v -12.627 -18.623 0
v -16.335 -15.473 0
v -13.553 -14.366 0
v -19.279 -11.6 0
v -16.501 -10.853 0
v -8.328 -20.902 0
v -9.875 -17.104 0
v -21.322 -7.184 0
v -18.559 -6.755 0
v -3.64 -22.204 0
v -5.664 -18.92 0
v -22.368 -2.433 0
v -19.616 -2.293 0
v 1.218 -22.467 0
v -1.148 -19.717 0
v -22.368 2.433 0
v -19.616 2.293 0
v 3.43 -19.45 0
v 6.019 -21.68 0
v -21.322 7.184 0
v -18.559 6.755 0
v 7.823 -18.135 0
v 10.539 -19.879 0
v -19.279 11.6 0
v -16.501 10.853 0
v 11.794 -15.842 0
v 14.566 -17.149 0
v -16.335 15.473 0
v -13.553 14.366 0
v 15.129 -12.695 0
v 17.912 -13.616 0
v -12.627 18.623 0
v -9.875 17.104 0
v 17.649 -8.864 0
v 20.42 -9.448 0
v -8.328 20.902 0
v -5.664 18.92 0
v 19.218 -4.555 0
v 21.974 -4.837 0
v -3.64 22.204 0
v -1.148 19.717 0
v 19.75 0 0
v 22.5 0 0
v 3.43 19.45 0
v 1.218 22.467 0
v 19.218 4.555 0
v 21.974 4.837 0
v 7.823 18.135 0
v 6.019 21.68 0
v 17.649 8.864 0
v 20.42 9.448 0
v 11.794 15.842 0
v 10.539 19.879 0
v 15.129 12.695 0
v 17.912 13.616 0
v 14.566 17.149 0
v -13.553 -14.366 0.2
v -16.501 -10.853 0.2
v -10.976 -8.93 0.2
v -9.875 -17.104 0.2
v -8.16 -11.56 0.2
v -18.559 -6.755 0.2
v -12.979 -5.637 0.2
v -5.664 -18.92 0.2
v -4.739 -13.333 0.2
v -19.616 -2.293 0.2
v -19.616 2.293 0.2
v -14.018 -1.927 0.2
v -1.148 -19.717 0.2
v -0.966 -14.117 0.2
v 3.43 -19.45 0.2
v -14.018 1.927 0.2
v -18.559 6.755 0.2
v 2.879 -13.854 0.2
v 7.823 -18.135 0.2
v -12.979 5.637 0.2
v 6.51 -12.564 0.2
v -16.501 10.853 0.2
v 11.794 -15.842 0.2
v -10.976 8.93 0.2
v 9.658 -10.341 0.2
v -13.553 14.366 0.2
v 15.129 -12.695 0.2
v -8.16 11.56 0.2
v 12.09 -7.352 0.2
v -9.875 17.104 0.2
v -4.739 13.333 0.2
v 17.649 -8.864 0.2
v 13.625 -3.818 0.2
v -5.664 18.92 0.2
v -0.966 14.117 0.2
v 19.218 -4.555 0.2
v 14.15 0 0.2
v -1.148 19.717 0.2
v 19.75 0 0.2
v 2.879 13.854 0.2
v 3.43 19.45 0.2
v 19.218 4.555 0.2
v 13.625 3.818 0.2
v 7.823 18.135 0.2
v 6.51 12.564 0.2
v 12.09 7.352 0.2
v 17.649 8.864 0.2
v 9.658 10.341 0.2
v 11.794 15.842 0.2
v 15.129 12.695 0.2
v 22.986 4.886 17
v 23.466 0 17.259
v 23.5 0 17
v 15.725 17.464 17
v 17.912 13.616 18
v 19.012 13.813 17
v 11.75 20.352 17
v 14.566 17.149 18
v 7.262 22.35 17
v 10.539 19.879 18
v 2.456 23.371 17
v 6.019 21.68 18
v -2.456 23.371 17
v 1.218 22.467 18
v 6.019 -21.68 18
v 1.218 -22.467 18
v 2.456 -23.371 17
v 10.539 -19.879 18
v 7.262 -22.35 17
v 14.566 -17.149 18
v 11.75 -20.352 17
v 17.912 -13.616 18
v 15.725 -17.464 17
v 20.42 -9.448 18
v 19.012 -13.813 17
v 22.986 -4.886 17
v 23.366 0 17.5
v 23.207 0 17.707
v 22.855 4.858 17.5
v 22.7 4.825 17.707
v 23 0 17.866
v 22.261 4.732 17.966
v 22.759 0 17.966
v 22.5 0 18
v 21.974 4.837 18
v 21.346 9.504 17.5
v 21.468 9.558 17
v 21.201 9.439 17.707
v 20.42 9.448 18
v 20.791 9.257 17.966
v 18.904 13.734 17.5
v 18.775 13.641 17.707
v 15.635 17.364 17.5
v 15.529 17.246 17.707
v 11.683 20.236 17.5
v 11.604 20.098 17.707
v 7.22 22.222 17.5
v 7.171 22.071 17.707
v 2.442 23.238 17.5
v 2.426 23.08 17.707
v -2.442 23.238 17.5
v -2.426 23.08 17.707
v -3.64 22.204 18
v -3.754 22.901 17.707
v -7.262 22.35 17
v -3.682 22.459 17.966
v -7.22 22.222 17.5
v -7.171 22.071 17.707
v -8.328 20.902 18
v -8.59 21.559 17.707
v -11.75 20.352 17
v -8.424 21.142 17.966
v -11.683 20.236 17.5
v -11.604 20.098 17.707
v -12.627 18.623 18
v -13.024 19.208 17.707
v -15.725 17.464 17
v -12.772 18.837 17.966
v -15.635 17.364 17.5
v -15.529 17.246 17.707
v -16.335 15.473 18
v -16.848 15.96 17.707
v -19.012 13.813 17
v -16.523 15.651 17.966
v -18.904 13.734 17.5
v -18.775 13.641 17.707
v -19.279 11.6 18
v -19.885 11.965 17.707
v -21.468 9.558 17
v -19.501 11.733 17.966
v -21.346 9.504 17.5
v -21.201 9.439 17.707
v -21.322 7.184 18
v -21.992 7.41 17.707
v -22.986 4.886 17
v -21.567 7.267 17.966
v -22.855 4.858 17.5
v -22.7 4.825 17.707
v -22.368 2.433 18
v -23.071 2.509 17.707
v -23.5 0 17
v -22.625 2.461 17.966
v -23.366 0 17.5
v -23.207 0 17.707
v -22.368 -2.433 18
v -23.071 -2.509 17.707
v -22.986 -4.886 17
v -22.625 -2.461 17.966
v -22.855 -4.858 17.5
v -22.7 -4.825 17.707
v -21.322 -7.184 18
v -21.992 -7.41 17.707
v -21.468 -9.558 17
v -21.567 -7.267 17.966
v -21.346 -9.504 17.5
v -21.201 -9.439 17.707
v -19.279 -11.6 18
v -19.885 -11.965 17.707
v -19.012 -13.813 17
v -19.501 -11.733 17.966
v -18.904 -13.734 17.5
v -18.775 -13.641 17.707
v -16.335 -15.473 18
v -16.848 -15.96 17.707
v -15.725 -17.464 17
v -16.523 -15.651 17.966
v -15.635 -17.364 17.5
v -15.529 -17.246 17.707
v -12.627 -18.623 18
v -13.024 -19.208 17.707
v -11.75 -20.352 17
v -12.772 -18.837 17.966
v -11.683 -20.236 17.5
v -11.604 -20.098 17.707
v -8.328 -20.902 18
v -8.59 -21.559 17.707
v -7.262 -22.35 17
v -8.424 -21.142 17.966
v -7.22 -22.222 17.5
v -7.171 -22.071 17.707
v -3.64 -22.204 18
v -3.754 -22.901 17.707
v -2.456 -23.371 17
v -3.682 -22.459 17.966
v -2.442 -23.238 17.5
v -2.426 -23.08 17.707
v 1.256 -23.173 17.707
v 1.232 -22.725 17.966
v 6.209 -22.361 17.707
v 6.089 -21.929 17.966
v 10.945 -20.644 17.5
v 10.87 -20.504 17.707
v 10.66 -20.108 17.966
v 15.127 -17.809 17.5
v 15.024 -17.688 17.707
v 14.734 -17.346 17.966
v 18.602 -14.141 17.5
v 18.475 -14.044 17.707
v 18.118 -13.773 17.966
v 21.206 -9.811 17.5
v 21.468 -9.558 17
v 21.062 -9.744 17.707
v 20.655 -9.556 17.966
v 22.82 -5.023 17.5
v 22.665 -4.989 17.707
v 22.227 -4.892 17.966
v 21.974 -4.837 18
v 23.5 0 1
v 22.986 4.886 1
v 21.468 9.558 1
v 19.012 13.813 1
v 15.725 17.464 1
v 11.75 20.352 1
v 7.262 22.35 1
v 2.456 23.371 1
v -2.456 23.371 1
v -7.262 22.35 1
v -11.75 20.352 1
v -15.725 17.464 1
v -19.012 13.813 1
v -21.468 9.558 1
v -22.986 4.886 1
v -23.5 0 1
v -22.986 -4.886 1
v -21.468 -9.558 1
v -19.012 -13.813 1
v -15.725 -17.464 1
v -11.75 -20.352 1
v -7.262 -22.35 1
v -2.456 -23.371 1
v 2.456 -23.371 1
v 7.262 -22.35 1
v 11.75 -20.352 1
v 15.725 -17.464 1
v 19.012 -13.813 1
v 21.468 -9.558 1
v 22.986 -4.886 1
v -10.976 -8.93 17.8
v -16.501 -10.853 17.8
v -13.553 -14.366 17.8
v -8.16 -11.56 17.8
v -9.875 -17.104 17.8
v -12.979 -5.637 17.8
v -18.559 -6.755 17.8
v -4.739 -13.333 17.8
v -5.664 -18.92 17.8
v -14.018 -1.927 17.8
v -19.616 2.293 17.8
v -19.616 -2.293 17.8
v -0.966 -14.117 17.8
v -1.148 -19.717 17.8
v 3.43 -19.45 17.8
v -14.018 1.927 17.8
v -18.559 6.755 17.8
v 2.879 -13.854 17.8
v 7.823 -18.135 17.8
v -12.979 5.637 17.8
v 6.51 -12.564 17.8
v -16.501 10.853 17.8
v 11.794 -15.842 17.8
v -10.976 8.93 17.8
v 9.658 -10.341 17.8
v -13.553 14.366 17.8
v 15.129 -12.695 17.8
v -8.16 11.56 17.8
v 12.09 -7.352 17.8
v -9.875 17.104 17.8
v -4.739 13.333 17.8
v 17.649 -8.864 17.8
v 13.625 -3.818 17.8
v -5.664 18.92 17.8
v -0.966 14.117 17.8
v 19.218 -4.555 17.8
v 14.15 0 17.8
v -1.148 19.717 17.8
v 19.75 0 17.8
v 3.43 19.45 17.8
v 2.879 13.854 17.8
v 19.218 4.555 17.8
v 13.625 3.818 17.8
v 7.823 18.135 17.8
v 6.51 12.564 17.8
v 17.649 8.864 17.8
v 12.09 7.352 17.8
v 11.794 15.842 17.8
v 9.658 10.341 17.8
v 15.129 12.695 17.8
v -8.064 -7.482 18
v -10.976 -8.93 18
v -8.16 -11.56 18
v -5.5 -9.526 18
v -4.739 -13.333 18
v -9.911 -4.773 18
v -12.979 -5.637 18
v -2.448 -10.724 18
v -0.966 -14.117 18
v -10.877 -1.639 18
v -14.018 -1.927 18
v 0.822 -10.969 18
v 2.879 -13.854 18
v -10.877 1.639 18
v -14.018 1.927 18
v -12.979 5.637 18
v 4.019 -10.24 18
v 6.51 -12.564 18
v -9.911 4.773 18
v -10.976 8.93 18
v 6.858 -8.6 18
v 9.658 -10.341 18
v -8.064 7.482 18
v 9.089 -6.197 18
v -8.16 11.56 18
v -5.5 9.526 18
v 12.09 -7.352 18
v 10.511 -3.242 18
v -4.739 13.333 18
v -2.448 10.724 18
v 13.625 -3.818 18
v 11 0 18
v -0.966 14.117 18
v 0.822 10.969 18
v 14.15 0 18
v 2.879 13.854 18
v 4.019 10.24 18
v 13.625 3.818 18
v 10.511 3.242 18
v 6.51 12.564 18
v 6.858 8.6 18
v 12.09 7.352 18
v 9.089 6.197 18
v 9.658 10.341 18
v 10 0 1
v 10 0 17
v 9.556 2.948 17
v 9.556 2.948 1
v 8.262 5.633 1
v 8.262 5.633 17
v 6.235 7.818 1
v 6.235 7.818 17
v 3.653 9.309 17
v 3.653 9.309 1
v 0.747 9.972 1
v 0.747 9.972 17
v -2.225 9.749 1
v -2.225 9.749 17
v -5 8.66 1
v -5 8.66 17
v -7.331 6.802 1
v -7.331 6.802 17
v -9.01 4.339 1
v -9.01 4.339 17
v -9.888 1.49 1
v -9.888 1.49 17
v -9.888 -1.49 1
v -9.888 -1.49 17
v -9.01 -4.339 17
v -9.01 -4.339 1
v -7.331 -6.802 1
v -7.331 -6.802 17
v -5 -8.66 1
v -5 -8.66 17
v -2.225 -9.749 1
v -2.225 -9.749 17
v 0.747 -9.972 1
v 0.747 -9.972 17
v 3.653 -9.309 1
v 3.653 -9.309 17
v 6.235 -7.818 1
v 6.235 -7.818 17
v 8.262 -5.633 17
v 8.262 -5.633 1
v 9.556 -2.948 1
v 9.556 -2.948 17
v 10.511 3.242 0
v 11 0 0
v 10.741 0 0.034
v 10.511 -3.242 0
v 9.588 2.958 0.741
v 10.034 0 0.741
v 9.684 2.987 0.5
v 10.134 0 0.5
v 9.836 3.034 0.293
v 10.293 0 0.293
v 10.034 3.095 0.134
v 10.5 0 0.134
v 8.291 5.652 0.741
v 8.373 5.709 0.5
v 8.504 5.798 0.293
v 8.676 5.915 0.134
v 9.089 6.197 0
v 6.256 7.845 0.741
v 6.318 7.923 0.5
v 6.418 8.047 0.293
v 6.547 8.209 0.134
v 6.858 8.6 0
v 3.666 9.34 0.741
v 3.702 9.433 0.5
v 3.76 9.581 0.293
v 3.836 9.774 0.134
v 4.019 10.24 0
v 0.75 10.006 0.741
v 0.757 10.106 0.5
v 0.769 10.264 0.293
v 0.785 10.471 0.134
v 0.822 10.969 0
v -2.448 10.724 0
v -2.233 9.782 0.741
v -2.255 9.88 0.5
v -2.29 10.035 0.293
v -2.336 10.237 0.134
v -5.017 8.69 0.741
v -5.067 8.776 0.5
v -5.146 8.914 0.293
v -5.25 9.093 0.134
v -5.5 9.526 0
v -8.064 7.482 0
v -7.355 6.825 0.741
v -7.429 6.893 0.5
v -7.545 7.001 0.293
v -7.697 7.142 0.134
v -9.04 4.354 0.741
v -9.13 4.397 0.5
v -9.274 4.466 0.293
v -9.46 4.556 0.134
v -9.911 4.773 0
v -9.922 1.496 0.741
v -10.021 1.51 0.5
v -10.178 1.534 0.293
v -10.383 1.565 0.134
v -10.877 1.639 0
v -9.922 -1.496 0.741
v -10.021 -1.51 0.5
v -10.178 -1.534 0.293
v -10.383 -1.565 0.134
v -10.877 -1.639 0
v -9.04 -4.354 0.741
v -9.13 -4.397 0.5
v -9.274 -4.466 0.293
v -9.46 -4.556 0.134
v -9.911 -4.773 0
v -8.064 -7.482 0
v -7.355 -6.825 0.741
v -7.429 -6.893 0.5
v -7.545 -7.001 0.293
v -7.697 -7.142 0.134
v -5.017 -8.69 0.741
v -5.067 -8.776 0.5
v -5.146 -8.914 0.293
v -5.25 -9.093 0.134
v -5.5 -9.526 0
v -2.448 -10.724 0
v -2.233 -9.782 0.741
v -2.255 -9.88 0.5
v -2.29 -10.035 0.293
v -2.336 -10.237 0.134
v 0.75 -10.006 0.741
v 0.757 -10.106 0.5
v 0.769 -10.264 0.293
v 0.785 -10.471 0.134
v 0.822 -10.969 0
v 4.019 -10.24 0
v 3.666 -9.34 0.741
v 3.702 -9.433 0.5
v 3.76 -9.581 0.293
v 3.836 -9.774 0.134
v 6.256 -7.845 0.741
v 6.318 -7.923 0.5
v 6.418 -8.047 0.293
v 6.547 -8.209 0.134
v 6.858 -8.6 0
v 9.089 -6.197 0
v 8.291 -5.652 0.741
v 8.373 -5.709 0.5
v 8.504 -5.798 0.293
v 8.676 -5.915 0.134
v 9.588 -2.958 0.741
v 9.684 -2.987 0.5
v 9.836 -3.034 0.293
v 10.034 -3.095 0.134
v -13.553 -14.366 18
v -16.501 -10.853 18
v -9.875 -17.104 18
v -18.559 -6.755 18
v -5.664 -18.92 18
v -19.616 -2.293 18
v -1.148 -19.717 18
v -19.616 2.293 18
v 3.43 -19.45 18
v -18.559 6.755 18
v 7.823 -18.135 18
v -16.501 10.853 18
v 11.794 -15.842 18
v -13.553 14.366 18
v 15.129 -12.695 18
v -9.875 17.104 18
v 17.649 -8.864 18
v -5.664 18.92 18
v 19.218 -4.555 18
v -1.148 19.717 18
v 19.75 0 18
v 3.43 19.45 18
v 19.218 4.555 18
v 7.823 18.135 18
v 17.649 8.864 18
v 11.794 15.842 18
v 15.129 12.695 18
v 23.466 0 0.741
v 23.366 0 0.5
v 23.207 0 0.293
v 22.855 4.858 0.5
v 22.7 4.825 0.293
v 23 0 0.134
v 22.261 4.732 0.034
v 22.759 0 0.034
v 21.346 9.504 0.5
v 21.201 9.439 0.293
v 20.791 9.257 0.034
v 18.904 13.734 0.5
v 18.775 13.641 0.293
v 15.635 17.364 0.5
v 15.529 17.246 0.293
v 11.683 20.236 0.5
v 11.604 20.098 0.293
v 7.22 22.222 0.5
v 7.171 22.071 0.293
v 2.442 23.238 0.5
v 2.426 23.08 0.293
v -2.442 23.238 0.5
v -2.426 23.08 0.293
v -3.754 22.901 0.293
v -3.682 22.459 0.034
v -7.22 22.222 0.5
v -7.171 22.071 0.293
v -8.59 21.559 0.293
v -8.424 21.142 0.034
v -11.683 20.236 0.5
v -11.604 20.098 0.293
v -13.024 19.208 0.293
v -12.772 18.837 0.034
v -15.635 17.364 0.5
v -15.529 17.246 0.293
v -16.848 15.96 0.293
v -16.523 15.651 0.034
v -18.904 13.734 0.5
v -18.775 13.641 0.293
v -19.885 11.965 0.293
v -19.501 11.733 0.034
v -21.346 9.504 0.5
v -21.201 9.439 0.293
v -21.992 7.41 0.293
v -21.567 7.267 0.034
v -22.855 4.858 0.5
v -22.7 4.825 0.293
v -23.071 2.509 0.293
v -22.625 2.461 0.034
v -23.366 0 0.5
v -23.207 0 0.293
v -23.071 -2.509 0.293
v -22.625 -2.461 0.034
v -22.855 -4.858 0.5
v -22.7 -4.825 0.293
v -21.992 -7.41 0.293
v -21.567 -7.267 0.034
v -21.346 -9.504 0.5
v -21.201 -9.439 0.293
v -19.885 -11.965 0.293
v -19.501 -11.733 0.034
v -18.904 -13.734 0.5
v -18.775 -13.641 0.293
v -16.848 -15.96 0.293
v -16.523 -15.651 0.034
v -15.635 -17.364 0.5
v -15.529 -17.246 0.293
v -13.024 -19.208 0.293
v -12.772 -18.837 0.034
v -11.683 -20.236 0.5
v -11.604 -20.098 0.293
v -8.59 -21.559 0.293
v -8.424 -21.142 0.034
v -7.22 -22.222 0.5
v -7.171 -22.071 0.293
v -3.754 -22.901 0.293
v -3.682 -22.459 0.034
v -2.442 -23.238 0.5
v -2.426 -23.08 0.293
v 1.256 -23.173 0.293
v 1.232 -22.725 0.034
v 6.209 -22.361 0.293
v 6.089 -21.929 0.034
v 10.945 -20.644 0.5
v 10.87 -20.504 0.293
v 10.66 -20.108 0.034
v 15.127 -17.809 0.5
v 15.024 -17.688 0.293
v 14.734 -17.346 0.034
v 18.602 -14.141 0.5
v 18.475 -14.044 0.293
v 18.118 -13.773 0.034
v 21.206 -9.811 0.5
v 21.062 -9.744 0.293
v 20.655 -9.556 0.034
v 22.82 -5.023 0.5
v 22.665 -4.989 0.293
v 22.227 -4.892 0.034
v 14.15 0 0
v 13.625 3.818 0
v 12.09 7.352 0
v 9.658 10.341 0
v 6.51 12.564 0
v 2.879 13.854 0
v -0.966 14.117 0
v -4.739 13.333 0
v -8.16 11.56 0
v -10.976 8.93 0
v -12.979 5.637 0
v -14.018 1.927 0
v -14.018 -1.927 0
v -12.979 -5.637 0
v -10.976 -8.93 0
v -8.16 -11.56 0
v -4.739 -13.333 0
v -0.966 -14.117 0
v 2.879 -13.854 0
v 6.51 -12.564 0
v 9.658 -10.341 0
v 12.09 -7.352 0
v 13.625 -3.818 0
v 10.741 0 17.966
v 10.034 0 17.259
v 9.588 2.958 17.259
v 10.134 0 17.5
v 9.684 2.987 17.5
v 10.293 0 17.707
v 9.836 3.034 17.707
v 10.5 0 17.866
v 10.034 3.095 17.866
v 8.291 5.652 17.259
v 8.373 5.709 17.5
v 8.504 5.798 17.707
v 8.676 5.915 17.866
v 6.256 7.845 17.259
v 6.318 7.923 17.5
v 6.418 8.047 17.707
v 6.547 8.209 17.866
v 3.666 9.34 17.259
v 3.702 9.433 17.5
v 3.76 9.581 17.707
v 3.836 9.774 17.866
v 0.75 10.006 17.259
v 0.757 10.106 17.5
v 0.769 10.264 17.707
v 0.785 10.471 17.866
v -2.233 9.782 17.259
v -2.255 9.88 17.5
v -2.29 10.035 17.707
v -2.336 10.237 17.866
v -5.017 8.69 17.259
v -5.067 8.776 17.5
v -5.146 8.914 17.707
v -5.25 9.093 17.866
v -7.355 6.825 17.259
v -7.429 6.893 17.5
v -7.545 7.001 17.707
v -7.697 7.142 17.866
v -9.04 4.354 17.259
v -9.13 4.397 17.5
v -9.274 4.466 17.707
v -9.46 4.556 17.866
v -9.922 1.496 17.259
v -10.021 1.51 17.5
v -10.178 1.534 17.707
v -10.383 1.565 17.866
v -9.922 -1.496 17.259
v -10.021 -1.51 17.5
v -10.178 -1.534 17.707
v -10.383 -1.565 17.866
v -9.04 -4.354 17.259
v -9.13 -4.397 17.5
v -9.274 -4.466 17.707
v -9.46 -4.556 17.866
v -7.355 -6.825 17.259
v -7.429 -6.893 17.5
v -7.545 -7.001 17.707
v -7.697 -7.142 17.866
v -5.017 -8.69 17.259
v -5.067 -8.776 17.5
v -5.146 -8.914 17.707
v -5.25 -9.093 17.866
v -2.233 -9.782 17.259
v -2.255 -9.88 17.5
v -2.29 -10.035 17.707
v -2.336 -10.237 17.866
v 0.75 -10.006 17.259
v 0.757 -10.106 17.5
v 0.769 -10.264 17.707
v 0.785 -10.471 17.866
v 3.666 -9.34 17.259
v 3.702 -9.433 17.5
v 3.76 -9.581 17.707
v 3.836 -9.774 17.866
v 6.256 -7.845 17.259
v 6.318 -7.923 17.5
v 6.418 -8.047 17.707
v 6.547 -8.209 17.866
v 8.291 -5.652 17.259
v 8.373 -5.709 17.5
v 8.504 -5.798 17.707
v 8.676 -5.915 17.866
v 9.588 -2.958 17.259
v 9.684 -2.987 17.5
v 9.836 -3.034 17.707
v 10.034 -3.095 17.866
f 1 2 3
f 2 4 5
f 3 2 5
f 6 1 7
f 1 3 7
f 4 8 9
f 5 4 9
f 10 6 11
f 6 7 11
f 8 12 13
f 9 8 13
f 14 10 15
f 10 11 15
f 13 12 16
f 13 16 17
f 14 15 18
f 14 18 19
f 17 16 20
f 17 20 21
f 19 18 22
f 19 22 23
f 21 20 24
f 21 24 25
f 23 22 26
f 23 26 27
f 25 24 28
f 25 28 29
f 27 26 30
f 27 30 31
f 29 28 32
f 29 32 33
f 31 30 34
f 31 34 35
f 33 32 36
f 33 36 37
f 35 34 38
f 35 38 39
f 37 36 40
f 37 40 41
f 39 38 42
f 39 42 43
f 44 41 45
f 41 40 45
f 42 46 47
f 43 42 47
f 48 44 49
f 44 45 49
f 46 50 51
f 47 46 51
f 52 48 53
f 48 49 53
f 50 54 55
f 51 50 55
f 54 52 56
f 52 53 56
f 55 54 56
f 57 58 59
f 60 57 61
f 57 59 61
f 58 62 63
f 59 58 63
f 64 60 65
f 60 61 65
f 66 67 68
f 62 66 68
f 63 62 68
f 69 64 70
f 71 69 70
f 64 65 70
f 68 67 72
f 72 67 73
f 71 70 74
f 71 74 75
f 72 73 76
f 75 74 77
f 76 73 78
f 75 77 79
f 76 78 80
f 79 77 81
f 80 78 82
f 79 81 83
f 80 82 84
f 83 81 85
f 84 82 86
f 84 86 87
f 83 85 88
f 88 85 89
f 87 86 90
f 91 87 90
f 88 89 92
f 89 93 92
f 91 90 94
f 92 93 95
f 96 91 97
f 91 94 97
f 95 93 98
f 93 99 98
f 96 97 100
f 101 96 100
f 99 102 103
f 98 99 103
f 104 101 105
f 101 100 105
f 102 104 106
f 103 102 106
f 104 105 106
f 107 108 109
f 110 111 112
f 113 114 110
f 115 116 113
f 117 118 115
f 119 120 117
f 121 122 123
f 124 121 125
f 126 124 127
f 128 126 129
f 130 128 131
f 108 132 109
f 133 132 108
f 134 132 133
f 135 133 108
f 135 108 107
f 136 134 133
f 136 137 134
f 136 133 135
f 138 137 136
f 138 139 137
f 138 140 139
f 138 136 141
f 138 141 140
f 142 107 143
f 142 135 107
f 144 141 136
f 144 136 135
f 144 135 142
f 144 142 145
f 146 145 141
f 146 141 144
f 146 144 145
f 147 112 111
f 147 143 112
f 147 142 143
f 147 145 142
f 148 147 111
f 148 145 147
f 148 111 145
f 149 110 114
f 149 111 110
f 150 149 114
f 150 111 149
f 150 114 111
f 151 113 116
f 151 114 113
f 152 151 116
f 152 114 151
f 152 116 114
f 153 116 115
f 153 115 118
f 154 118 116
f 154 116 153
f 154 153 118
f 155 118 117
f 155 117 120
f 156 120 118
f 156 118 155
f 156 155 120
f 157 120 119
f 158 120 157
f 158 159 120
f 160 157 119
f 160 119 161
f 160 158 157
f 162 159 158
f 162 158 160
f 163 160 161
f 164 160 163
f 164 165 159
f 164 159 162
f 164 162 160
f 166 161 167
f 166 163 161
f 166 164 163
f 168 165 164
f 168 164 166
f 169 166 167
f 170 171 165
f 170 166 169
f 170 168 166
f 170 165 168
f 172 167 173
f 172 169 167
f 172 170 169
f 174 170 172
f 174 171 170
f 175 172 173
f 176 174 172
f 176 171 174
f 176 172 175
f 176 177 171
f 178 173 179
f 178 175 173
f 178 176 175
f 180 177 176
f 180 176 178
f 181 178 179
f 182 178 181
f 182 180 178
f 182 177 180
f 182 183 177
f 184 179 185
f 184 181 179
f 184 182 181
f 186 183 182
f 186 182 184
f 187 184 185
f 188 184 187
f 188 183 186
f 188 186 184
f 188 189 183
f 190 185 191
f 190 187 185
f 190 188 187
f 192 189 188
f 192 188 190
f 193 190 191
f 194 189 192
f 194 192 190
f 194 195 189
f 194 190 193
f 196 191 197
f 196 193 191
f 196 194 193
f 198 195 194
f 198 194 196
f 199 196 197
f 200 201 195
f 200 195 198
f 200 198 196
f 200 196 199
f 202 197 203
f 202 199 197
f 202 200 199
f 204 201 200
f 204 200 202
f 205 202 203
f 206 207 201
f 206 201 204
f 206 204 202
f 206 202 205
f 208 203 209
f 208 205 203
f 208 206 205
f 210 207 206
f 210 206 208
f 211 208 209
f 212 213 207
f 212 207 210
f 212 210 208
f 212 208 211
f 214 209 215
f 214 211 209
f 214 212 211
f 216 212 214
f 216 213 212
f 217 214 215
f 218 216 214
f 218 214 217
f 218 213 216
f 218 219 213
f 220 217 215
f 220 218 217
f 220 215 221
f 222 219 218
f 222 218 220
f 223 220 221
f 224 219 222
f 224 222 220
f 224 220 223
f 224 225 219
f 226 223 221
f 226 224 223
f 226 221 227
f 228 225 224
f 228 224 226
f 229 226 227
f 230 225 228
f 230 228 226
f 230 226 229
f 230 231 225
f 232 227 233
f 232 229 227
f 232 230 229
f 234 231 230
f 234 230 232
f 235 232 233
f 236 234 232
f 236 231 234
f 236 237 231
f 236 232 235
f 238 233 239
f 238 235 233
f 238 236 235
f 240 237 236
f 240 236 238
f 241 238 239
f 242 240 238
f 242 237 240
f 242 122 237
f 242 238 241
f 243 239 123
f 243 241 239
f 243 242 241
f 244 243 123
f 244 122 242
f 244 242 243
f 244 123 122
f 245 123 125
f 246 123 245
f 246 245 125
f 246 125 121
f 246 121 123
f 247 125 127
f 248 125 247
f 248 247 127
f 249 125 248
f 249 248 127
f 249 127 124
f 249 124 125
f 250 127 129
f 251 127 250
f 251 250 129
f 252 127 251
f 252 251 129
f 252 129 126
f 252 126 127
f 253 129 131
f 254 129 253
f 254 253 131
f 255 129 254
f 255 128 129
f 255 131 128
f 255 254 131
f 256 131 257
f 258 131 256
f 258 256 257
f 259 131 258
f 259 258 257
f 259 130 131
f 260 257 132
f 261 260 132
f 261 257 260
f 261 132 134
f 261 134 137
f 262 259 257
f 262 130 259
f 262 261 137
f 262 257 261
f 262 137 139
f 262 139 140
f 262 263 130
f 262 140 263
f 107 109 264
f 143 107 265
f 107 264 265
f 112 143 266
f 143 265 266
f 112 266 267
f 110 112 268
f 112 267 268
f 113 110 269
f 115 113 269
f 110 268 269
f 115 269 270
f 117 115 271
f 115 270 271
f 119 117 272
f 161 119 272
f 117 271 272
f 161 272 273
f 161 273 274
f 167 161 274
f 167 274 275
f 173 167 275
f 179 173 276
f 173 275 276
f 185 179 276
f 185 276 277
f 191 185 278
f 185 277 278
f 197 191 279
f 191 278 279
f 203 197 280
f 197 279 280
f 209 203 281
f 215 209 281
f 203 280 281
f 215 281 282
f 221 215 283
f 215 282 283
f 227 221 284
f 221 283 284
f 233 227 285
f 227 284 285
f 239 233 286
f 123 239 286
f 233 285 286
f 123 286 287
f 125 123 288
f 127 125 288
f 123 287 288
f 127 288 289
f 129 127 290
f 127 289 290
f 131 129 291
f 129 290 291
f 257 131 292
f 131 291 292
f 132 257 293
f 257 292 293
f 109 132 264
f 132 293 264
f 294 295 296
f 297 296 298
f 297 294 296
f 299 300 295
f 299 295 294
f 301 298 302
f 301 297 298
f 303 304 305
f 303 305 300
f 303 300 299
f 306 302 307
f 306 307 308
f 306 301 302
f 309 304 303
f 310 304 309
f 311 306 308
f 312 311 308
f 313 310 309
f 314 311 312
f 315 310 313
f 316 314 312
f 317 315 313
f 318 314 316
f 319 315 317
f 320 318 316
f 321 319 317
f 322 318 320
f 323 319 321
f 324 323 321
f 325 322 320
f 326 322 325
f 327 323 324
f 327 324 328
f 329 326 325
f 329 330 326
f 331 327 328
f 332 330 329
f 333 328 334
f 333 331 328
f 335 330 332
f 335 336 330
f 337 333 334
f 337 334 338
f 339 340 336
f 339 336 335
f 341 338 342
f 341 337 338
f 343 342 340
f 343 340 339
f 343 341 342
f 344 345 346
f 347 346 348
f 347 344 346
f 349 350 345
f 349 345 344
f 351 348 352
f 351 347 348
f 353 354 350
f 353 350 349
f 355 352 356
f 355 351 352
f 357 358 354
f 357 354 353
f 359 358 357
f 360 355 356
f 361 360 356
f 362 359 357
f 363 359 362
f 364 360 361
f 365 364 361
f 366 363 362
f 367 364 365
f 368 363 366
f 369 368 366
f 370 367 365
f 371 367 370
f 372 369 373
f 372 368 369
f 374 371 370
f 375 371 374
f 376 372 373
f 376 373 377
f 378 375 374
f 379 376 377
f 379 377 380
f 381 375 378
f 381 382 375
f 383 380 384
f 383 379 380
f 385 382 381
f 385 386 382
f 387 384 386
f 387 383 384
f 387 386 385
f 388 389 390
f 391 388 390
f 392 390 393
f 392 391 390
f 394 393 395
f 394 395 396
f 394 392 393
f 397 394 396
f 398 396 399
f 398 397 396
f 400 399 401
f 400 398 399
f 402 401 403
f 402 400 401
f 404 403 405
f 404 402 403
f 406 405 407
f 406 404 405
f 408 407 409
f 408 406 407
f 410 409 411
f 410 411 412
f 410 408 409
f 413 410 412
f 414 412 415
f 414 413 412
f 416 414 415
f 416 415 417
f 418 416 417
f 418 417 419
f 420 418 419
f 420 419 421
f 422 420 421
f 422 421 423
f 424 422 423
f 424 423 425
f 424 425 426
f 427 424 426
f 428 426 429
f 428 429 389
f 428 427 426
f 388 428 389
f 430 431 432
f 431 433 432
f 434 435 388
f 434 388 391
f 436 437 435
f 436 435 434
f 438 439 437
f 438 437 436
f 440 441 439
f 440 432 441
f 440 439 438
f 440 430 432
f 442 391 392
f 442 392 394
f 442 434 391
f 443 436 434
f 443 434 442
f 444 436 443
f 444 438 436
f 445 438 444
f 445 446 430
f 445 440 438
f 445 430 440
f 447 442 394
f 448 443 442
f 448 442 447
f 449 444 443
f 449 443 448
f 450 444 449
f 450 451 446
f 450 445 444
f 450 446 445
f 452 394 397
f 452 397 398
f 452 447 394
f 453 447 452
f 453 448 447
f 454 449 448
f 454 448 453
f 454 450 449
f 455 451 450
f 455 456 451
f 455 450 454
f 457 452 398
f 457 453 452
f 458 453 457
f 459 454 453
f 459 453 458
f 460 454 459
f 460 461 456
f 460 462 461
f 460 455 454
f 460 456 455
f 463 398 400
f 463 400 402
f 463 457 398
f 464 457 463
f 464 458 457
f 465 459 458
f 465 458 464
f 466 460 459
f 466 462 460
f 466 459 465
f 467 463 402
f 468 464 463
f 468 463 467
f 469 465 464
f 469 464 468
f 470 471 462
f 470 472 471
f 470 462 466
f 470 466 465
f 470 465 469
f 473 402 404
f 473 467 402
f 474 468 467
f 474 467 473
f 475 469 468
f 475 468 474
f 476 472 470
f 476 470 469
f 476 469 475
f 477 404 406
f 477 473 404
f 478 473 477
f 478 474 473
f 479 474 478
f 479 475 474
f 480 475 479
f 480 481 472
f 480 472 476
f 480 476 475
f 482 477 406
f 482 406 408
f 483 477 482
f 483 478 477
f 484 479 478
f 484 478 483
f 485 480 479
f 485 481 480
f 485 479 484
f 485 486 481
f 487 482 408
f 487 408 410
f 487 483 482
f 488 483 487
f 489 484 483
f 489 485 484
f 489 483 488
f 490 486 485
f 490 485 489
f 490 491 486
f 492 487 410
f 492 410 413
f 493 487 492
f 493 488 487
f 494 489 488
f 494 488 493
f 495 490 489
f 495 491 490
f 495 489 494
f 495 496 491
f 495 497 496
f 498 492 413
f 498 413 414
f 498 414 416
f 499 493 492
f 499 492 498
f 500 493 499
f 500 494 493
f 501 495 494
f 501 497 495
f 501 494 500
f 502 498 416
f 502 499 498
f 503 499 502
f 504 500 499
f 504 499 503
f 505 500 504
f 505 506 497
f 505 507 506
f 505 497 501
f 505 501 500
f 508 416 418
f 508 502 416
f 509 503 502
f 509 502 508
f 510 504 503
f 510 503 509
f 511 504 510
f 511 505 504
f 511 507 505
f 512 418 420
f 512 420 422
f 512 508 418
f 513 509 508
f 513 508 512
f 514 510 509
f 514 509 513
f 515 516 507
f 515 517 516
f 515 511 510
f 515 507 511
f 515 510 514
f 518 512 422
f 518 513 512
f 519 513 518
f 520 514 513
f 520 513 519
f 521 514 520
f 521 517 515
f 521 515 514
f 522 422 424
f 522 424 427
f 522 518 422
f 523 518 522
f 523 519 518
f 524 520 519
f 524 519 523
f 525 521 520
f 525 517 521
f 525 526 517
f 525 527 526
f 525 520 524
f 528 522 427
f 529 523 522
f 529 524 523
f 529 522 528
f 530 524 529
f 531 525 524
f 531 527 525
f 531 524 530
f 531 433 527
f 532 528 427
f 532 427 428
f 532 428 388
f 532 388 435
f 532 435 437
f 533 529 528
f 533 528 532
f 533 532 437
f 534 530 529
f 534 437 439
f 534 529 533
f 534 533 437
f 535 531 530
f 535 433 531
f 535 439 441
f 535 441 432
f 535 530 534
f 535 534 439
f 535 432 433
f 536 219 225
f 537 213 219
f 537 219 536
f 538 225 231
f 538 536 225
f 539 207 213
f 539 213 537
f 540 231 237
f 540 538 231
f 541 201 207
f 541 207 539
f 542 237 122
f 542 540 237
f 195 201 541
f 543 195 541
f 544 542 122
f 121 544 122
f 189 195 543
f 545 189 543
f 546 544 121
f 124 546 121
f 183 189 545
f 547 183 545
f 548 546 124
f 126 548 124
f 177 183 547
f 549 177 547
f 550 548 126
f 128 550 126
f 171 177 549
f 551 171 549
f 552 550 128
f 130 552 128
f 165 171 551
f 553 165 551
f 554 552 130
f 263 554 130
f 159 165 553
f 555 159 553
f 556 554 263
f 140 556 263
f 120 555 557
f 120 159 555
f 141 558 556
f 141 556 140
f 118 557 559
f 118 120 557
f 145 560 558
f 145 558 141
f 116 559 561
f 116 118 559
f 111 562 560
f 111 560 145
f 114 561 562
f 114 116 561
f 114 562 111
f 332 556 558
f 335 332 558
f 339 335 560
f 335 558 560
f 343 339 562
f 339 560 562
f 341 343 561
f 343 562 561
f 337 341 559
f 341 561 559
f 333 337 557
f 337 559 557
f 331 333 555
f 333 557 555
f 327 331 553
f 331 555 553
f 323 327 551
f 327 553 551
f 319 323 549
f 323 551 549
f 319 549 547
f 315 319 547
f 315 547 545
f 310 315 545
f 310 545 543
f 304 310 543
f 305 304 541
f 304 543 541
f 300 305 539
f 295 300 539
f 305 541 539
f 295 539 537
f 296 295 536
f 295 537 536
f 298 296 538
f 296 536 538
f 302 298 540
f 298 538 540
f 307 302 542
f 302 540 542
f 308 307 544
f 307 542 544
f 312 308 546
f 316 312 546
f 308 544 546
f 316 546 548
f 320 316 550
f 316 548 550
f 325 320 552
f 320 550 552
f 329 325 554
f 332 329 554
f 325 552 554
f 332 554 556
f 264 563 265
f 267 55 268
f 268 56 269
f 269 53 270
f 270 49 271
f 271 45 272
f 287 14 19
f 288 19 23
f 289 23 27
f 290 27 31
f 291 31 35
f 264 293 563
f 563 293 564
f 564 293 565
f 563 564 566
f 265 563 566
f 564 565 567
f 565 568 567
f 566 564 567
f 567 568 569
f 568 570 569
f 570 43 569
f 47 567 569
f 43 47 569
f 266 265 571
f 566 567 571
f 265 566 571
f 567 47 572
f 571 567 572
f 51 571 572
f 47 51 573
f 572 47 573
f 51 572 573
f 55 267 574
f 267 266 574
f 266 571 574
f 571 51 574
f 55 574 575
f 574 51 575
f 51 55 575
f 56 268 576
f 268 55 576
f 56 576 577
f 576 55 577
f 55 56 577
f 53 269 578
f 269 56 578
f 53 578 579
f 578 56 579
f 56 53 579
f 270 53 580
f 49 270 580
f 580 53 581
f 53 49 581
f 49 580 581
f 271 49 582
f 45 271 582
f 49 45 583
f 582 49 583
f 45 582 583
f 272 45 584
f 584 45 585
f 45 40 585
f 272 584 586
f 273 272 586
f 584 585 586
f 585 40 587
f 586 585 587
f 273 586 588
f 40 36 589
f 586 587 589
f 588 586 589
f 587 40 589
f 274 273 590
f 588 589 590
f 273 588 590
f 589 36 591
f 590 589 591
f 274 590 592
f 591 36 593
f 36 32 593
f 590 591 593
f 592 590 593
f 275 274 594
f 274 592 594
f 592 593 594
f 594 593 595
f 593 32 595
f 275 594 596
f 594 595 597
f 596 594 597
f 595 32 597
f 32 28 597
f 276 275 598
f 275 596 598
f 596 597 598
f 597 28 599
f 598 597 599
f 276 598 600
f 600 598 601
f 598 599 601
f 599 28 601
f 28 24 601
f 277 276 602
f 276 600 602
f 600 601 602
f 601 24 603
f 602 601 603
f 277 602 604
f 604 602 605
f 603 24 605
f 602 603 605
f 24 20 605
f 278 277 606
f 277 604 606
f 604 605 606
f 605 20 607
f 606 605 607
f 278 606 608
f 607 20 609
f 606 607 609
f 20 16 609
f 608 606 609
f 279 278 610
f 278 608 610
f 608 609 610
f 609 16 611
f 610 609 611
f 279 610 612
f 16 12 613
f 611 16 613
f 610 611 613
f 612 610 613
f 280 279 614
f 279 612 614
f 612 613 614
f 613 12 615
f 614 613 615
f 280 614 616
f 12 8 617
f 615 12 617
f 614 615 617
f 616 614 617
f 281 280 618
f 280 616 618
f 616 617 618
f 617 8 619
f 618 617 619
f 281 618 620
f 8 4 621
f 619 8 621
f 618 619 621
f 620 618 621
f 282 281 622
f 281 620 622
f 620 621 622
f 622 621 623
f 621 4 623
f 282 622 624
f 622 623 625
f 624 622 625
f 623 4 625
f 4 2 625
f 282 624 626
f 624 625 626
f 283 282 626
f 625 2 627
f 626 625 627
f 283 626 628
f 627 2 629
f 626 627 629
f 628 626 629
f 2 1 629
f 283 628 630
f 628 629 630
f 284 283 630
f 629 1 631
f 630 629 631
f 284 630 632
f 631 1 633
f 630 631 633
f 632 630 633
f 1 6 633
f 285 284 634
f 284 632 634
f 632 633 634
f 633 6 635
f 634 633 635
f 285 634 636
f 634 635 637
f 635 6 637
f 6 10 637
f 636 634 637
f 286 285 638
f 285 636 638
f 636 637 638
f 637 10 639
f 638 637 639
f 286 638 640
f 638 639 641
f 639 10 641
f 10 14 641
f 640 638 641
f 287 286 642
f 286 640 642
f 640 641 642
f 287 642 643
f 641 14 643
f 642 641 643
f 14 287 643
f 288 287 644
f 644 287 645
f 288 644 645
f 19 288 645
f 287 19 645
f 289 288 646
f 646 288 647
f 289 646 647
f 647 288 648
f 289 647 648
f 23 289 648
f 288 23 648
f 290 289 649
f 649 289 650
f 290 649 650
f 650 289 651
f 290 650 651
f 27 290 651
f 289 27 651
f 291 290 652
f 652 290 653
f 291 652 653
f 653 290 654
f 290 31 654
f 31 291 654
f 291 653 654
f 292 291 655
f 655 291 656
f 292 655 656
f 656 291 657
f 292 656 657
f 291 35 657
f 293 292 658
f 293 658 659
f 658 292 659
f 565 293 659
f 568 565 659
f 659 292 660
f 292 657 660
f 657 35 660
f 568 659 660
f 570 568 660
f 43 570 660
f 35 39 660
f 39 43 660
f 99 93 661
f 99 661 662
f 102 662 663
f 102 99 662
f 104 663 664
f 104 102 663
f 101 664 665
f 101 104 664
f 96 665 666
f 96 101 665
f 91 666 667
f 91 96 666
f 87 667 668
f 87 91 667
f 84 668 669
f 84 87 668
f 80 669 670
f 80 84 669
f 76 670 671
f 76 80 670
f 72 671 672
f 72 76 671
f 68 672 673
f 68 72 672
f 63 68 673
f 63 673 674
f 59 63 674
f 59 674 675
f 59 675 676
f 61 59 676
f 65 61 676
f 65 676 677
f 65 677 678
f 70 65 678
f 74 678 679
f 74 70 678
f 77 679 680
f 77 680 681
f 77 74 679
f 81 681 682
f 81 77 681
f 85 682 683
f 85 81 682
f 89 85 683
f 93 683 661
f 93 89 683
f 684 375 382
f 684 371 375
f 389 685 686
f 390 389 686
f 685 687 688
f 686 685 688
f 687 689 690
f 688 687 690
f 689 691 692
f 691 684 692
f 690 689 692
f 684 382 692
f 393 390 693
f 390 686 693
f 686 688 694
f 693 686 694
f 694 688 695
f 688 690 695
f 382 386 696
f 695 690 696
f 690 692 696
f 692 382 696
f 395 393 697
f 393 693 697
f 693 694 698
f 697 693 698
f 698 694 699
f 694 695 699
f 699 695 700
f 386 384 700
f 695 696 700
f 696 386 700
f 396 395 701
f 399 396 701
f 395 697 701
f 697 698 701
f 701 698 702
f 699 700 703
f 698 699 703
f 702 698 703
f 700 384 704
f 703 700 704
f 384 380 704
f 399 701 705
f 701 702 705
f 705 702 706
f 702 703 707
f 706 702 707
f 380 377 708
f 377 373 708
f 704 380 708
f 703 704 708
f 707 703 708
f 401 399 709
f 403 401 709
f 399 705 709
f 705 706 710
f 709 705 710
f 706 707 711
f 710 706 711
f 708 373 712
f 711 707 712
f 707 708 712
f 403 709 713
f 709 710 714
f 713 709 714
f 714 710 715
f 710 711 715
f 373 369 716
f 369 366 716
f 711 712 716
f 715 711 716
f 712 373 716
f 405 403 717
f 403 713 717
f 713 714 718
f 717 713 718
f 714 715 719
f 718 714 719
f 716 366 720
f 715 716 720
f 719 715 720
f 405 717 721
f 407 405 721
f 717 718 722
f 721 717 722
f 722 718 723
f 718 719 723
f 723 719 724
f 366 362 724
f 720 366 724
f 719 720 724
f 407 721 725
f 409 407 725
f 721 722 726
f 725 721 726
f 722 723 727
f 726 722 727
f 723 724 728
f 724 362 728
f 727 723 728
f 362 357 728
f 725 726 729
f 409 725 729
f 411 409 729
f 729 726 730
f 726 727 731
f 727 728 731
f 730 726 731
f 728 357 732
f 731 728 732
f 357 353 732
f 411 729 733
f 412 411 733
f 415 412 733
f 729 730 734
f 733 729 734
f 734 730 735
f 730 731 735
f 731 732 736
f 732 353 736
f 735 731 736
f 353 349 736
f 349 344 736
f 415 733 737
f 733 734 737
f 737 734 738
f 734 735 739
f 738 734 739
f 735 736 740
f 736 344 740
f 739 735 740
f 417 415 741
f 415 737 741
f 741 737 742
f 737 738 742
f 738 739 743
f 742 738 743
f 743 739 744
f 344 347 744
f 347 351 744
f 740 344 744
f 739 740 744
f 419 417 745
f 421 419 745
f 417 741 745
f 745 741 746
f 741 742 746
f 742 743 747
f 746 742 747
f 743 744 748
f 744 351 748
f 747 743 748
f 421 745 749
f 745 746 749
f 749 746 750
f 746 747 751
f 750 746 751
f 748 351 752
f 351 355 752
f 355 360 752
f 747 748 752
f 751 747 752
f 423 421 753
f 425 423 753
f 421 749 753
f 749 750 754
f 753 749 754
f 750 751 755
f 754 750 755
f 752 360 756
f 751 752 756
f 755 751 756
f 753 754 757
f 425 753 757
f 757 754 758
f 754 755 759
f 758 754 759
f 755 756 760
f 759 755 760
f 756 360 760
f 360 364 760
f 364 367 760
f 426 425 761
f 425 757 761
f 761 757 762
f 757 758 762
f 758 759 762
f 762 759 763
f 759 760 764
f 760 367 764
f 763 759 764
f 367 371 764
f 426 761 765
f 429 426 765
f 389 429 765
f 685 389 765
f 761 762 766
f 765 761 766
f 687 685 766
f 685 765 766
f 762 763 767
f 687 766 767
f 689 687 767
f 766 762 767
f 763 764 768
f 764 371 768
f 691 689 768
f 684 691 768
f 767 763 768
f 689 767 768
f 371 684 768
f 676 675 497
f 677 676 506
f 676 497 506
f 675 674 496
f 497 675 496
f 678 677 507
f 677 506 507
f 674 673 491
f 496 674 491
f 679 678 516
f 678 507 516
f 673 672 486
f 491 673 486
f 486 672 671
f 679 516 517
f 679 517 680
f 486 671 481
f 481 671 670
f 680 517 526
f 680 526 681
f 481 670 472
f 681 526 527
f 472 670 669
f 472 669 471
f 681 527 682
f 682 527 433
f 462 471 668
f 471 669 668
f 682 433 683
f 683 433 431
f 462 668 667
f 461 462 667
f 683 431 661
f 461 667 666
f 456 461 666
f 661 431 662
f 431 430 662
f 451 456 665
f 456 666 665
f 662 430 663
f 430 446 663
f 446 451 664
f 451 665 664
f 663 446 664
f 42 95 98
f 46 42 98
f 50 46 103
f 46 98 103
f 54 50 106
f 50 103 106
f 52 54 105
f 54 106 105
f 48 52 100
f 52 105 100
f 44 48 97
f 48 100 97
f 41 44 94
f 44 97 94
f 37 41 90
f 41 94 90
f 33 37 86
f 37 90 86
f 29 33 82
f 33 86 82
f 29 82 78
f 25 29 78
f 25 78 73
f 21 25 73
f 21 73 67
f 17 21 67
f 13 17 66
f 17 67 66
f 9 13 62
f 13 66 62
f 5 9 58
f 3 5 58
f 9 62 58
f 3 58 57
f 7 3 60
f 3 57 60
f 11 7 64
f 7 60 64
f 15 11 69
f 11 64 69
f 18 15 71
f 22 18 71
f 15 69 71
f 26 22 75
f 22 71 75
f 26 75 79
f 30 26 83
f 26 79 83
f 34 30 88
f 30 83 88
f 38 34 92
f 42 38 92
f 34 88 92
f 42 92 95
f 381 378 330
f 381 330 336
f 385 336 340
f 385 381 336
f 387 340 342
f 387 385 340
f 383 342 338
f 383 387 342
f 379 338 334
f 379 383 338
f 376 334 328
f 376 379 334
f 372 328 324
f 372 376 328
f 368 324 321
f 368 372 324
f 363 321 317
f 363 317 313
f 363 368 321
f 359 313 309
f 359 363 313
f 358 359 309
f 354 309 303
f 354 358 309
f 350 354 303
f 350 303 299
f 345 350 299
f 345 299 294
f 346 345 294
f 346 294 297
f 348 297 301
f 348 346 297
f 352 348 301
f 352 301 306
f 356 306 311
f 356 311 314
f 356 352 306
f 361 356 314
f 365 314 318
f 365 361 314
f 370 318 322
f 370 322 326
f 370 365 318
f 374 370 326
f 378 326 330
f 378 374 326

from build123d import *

# Parameters (mm, degrees)
SKETCH_1_R          = 23.5
SKETCH_1_R_2        = 10
EXTRUDE_1_DEPTH     = 18
FILLET_1_R          = 1
SKETCH_2_R          = 19.75
SKETCH_2_R_2        = 14.15
CUT_EXTRUDE_1_DEPTH = 0.2
CUT_EXTRUDE_START   = -17.8
SKETCH_2_3_R        = 19.75
SKETCH_2_3_R_2      = 14.15
CUT_EXTRUDE_2_DEPTH = 0.2


with BuildPart() as part:
    # Эскиз1 → Бобышка-Вытянуть1 (new body)
    with BuildSketch(Plane.XY):
        Circle(SKETCH_1_R)
        Circle(SKETCH_1_R_2, mode=Mode.SUBTRACT)
    extrude(amount=EXTRUDE_1_DEPTH)

    # Скругление1
    fillet_1_edges = [part.edges().sort_by_distance(p)[0] for p in [
        (-23.5, 0, 0),
        (-23.5, 0, 18),
        (-10, 0, 0),
        (-10, 0, 18),
    ]]
    fillet(fillet_1_edges, radius=FILLET_1_R)

    # Эскиз2 → Вырез-Вытянуть1 (cut)
    with BuildSketch(Plane.XY.offset(18)):
        Circle(SKETCH_2_R)
        Circle(SKETCH_2_R_2, mode=Mode.SUBTRACT)
    extrude(amount=-CUT_EXTRUDE_1_DEPTH, mode=Mode.SUBTRACT)

    # Эскиз2<3> → Вырез-Вытянуть2 (cut)
    with BuildSketch(Plane.XY.offset(18).offset(CUT_EXTRUDE_START)):
        Circle(SKETCH_2_3_R)
        Circle(SKETCH_2_3_R_2, mode=Mode.SUBTRACT)
    extrude(amount=-CUT_EXTRUDE_2_DEPTH, mode=Mode.SUBTRACT)


solid = part.part
